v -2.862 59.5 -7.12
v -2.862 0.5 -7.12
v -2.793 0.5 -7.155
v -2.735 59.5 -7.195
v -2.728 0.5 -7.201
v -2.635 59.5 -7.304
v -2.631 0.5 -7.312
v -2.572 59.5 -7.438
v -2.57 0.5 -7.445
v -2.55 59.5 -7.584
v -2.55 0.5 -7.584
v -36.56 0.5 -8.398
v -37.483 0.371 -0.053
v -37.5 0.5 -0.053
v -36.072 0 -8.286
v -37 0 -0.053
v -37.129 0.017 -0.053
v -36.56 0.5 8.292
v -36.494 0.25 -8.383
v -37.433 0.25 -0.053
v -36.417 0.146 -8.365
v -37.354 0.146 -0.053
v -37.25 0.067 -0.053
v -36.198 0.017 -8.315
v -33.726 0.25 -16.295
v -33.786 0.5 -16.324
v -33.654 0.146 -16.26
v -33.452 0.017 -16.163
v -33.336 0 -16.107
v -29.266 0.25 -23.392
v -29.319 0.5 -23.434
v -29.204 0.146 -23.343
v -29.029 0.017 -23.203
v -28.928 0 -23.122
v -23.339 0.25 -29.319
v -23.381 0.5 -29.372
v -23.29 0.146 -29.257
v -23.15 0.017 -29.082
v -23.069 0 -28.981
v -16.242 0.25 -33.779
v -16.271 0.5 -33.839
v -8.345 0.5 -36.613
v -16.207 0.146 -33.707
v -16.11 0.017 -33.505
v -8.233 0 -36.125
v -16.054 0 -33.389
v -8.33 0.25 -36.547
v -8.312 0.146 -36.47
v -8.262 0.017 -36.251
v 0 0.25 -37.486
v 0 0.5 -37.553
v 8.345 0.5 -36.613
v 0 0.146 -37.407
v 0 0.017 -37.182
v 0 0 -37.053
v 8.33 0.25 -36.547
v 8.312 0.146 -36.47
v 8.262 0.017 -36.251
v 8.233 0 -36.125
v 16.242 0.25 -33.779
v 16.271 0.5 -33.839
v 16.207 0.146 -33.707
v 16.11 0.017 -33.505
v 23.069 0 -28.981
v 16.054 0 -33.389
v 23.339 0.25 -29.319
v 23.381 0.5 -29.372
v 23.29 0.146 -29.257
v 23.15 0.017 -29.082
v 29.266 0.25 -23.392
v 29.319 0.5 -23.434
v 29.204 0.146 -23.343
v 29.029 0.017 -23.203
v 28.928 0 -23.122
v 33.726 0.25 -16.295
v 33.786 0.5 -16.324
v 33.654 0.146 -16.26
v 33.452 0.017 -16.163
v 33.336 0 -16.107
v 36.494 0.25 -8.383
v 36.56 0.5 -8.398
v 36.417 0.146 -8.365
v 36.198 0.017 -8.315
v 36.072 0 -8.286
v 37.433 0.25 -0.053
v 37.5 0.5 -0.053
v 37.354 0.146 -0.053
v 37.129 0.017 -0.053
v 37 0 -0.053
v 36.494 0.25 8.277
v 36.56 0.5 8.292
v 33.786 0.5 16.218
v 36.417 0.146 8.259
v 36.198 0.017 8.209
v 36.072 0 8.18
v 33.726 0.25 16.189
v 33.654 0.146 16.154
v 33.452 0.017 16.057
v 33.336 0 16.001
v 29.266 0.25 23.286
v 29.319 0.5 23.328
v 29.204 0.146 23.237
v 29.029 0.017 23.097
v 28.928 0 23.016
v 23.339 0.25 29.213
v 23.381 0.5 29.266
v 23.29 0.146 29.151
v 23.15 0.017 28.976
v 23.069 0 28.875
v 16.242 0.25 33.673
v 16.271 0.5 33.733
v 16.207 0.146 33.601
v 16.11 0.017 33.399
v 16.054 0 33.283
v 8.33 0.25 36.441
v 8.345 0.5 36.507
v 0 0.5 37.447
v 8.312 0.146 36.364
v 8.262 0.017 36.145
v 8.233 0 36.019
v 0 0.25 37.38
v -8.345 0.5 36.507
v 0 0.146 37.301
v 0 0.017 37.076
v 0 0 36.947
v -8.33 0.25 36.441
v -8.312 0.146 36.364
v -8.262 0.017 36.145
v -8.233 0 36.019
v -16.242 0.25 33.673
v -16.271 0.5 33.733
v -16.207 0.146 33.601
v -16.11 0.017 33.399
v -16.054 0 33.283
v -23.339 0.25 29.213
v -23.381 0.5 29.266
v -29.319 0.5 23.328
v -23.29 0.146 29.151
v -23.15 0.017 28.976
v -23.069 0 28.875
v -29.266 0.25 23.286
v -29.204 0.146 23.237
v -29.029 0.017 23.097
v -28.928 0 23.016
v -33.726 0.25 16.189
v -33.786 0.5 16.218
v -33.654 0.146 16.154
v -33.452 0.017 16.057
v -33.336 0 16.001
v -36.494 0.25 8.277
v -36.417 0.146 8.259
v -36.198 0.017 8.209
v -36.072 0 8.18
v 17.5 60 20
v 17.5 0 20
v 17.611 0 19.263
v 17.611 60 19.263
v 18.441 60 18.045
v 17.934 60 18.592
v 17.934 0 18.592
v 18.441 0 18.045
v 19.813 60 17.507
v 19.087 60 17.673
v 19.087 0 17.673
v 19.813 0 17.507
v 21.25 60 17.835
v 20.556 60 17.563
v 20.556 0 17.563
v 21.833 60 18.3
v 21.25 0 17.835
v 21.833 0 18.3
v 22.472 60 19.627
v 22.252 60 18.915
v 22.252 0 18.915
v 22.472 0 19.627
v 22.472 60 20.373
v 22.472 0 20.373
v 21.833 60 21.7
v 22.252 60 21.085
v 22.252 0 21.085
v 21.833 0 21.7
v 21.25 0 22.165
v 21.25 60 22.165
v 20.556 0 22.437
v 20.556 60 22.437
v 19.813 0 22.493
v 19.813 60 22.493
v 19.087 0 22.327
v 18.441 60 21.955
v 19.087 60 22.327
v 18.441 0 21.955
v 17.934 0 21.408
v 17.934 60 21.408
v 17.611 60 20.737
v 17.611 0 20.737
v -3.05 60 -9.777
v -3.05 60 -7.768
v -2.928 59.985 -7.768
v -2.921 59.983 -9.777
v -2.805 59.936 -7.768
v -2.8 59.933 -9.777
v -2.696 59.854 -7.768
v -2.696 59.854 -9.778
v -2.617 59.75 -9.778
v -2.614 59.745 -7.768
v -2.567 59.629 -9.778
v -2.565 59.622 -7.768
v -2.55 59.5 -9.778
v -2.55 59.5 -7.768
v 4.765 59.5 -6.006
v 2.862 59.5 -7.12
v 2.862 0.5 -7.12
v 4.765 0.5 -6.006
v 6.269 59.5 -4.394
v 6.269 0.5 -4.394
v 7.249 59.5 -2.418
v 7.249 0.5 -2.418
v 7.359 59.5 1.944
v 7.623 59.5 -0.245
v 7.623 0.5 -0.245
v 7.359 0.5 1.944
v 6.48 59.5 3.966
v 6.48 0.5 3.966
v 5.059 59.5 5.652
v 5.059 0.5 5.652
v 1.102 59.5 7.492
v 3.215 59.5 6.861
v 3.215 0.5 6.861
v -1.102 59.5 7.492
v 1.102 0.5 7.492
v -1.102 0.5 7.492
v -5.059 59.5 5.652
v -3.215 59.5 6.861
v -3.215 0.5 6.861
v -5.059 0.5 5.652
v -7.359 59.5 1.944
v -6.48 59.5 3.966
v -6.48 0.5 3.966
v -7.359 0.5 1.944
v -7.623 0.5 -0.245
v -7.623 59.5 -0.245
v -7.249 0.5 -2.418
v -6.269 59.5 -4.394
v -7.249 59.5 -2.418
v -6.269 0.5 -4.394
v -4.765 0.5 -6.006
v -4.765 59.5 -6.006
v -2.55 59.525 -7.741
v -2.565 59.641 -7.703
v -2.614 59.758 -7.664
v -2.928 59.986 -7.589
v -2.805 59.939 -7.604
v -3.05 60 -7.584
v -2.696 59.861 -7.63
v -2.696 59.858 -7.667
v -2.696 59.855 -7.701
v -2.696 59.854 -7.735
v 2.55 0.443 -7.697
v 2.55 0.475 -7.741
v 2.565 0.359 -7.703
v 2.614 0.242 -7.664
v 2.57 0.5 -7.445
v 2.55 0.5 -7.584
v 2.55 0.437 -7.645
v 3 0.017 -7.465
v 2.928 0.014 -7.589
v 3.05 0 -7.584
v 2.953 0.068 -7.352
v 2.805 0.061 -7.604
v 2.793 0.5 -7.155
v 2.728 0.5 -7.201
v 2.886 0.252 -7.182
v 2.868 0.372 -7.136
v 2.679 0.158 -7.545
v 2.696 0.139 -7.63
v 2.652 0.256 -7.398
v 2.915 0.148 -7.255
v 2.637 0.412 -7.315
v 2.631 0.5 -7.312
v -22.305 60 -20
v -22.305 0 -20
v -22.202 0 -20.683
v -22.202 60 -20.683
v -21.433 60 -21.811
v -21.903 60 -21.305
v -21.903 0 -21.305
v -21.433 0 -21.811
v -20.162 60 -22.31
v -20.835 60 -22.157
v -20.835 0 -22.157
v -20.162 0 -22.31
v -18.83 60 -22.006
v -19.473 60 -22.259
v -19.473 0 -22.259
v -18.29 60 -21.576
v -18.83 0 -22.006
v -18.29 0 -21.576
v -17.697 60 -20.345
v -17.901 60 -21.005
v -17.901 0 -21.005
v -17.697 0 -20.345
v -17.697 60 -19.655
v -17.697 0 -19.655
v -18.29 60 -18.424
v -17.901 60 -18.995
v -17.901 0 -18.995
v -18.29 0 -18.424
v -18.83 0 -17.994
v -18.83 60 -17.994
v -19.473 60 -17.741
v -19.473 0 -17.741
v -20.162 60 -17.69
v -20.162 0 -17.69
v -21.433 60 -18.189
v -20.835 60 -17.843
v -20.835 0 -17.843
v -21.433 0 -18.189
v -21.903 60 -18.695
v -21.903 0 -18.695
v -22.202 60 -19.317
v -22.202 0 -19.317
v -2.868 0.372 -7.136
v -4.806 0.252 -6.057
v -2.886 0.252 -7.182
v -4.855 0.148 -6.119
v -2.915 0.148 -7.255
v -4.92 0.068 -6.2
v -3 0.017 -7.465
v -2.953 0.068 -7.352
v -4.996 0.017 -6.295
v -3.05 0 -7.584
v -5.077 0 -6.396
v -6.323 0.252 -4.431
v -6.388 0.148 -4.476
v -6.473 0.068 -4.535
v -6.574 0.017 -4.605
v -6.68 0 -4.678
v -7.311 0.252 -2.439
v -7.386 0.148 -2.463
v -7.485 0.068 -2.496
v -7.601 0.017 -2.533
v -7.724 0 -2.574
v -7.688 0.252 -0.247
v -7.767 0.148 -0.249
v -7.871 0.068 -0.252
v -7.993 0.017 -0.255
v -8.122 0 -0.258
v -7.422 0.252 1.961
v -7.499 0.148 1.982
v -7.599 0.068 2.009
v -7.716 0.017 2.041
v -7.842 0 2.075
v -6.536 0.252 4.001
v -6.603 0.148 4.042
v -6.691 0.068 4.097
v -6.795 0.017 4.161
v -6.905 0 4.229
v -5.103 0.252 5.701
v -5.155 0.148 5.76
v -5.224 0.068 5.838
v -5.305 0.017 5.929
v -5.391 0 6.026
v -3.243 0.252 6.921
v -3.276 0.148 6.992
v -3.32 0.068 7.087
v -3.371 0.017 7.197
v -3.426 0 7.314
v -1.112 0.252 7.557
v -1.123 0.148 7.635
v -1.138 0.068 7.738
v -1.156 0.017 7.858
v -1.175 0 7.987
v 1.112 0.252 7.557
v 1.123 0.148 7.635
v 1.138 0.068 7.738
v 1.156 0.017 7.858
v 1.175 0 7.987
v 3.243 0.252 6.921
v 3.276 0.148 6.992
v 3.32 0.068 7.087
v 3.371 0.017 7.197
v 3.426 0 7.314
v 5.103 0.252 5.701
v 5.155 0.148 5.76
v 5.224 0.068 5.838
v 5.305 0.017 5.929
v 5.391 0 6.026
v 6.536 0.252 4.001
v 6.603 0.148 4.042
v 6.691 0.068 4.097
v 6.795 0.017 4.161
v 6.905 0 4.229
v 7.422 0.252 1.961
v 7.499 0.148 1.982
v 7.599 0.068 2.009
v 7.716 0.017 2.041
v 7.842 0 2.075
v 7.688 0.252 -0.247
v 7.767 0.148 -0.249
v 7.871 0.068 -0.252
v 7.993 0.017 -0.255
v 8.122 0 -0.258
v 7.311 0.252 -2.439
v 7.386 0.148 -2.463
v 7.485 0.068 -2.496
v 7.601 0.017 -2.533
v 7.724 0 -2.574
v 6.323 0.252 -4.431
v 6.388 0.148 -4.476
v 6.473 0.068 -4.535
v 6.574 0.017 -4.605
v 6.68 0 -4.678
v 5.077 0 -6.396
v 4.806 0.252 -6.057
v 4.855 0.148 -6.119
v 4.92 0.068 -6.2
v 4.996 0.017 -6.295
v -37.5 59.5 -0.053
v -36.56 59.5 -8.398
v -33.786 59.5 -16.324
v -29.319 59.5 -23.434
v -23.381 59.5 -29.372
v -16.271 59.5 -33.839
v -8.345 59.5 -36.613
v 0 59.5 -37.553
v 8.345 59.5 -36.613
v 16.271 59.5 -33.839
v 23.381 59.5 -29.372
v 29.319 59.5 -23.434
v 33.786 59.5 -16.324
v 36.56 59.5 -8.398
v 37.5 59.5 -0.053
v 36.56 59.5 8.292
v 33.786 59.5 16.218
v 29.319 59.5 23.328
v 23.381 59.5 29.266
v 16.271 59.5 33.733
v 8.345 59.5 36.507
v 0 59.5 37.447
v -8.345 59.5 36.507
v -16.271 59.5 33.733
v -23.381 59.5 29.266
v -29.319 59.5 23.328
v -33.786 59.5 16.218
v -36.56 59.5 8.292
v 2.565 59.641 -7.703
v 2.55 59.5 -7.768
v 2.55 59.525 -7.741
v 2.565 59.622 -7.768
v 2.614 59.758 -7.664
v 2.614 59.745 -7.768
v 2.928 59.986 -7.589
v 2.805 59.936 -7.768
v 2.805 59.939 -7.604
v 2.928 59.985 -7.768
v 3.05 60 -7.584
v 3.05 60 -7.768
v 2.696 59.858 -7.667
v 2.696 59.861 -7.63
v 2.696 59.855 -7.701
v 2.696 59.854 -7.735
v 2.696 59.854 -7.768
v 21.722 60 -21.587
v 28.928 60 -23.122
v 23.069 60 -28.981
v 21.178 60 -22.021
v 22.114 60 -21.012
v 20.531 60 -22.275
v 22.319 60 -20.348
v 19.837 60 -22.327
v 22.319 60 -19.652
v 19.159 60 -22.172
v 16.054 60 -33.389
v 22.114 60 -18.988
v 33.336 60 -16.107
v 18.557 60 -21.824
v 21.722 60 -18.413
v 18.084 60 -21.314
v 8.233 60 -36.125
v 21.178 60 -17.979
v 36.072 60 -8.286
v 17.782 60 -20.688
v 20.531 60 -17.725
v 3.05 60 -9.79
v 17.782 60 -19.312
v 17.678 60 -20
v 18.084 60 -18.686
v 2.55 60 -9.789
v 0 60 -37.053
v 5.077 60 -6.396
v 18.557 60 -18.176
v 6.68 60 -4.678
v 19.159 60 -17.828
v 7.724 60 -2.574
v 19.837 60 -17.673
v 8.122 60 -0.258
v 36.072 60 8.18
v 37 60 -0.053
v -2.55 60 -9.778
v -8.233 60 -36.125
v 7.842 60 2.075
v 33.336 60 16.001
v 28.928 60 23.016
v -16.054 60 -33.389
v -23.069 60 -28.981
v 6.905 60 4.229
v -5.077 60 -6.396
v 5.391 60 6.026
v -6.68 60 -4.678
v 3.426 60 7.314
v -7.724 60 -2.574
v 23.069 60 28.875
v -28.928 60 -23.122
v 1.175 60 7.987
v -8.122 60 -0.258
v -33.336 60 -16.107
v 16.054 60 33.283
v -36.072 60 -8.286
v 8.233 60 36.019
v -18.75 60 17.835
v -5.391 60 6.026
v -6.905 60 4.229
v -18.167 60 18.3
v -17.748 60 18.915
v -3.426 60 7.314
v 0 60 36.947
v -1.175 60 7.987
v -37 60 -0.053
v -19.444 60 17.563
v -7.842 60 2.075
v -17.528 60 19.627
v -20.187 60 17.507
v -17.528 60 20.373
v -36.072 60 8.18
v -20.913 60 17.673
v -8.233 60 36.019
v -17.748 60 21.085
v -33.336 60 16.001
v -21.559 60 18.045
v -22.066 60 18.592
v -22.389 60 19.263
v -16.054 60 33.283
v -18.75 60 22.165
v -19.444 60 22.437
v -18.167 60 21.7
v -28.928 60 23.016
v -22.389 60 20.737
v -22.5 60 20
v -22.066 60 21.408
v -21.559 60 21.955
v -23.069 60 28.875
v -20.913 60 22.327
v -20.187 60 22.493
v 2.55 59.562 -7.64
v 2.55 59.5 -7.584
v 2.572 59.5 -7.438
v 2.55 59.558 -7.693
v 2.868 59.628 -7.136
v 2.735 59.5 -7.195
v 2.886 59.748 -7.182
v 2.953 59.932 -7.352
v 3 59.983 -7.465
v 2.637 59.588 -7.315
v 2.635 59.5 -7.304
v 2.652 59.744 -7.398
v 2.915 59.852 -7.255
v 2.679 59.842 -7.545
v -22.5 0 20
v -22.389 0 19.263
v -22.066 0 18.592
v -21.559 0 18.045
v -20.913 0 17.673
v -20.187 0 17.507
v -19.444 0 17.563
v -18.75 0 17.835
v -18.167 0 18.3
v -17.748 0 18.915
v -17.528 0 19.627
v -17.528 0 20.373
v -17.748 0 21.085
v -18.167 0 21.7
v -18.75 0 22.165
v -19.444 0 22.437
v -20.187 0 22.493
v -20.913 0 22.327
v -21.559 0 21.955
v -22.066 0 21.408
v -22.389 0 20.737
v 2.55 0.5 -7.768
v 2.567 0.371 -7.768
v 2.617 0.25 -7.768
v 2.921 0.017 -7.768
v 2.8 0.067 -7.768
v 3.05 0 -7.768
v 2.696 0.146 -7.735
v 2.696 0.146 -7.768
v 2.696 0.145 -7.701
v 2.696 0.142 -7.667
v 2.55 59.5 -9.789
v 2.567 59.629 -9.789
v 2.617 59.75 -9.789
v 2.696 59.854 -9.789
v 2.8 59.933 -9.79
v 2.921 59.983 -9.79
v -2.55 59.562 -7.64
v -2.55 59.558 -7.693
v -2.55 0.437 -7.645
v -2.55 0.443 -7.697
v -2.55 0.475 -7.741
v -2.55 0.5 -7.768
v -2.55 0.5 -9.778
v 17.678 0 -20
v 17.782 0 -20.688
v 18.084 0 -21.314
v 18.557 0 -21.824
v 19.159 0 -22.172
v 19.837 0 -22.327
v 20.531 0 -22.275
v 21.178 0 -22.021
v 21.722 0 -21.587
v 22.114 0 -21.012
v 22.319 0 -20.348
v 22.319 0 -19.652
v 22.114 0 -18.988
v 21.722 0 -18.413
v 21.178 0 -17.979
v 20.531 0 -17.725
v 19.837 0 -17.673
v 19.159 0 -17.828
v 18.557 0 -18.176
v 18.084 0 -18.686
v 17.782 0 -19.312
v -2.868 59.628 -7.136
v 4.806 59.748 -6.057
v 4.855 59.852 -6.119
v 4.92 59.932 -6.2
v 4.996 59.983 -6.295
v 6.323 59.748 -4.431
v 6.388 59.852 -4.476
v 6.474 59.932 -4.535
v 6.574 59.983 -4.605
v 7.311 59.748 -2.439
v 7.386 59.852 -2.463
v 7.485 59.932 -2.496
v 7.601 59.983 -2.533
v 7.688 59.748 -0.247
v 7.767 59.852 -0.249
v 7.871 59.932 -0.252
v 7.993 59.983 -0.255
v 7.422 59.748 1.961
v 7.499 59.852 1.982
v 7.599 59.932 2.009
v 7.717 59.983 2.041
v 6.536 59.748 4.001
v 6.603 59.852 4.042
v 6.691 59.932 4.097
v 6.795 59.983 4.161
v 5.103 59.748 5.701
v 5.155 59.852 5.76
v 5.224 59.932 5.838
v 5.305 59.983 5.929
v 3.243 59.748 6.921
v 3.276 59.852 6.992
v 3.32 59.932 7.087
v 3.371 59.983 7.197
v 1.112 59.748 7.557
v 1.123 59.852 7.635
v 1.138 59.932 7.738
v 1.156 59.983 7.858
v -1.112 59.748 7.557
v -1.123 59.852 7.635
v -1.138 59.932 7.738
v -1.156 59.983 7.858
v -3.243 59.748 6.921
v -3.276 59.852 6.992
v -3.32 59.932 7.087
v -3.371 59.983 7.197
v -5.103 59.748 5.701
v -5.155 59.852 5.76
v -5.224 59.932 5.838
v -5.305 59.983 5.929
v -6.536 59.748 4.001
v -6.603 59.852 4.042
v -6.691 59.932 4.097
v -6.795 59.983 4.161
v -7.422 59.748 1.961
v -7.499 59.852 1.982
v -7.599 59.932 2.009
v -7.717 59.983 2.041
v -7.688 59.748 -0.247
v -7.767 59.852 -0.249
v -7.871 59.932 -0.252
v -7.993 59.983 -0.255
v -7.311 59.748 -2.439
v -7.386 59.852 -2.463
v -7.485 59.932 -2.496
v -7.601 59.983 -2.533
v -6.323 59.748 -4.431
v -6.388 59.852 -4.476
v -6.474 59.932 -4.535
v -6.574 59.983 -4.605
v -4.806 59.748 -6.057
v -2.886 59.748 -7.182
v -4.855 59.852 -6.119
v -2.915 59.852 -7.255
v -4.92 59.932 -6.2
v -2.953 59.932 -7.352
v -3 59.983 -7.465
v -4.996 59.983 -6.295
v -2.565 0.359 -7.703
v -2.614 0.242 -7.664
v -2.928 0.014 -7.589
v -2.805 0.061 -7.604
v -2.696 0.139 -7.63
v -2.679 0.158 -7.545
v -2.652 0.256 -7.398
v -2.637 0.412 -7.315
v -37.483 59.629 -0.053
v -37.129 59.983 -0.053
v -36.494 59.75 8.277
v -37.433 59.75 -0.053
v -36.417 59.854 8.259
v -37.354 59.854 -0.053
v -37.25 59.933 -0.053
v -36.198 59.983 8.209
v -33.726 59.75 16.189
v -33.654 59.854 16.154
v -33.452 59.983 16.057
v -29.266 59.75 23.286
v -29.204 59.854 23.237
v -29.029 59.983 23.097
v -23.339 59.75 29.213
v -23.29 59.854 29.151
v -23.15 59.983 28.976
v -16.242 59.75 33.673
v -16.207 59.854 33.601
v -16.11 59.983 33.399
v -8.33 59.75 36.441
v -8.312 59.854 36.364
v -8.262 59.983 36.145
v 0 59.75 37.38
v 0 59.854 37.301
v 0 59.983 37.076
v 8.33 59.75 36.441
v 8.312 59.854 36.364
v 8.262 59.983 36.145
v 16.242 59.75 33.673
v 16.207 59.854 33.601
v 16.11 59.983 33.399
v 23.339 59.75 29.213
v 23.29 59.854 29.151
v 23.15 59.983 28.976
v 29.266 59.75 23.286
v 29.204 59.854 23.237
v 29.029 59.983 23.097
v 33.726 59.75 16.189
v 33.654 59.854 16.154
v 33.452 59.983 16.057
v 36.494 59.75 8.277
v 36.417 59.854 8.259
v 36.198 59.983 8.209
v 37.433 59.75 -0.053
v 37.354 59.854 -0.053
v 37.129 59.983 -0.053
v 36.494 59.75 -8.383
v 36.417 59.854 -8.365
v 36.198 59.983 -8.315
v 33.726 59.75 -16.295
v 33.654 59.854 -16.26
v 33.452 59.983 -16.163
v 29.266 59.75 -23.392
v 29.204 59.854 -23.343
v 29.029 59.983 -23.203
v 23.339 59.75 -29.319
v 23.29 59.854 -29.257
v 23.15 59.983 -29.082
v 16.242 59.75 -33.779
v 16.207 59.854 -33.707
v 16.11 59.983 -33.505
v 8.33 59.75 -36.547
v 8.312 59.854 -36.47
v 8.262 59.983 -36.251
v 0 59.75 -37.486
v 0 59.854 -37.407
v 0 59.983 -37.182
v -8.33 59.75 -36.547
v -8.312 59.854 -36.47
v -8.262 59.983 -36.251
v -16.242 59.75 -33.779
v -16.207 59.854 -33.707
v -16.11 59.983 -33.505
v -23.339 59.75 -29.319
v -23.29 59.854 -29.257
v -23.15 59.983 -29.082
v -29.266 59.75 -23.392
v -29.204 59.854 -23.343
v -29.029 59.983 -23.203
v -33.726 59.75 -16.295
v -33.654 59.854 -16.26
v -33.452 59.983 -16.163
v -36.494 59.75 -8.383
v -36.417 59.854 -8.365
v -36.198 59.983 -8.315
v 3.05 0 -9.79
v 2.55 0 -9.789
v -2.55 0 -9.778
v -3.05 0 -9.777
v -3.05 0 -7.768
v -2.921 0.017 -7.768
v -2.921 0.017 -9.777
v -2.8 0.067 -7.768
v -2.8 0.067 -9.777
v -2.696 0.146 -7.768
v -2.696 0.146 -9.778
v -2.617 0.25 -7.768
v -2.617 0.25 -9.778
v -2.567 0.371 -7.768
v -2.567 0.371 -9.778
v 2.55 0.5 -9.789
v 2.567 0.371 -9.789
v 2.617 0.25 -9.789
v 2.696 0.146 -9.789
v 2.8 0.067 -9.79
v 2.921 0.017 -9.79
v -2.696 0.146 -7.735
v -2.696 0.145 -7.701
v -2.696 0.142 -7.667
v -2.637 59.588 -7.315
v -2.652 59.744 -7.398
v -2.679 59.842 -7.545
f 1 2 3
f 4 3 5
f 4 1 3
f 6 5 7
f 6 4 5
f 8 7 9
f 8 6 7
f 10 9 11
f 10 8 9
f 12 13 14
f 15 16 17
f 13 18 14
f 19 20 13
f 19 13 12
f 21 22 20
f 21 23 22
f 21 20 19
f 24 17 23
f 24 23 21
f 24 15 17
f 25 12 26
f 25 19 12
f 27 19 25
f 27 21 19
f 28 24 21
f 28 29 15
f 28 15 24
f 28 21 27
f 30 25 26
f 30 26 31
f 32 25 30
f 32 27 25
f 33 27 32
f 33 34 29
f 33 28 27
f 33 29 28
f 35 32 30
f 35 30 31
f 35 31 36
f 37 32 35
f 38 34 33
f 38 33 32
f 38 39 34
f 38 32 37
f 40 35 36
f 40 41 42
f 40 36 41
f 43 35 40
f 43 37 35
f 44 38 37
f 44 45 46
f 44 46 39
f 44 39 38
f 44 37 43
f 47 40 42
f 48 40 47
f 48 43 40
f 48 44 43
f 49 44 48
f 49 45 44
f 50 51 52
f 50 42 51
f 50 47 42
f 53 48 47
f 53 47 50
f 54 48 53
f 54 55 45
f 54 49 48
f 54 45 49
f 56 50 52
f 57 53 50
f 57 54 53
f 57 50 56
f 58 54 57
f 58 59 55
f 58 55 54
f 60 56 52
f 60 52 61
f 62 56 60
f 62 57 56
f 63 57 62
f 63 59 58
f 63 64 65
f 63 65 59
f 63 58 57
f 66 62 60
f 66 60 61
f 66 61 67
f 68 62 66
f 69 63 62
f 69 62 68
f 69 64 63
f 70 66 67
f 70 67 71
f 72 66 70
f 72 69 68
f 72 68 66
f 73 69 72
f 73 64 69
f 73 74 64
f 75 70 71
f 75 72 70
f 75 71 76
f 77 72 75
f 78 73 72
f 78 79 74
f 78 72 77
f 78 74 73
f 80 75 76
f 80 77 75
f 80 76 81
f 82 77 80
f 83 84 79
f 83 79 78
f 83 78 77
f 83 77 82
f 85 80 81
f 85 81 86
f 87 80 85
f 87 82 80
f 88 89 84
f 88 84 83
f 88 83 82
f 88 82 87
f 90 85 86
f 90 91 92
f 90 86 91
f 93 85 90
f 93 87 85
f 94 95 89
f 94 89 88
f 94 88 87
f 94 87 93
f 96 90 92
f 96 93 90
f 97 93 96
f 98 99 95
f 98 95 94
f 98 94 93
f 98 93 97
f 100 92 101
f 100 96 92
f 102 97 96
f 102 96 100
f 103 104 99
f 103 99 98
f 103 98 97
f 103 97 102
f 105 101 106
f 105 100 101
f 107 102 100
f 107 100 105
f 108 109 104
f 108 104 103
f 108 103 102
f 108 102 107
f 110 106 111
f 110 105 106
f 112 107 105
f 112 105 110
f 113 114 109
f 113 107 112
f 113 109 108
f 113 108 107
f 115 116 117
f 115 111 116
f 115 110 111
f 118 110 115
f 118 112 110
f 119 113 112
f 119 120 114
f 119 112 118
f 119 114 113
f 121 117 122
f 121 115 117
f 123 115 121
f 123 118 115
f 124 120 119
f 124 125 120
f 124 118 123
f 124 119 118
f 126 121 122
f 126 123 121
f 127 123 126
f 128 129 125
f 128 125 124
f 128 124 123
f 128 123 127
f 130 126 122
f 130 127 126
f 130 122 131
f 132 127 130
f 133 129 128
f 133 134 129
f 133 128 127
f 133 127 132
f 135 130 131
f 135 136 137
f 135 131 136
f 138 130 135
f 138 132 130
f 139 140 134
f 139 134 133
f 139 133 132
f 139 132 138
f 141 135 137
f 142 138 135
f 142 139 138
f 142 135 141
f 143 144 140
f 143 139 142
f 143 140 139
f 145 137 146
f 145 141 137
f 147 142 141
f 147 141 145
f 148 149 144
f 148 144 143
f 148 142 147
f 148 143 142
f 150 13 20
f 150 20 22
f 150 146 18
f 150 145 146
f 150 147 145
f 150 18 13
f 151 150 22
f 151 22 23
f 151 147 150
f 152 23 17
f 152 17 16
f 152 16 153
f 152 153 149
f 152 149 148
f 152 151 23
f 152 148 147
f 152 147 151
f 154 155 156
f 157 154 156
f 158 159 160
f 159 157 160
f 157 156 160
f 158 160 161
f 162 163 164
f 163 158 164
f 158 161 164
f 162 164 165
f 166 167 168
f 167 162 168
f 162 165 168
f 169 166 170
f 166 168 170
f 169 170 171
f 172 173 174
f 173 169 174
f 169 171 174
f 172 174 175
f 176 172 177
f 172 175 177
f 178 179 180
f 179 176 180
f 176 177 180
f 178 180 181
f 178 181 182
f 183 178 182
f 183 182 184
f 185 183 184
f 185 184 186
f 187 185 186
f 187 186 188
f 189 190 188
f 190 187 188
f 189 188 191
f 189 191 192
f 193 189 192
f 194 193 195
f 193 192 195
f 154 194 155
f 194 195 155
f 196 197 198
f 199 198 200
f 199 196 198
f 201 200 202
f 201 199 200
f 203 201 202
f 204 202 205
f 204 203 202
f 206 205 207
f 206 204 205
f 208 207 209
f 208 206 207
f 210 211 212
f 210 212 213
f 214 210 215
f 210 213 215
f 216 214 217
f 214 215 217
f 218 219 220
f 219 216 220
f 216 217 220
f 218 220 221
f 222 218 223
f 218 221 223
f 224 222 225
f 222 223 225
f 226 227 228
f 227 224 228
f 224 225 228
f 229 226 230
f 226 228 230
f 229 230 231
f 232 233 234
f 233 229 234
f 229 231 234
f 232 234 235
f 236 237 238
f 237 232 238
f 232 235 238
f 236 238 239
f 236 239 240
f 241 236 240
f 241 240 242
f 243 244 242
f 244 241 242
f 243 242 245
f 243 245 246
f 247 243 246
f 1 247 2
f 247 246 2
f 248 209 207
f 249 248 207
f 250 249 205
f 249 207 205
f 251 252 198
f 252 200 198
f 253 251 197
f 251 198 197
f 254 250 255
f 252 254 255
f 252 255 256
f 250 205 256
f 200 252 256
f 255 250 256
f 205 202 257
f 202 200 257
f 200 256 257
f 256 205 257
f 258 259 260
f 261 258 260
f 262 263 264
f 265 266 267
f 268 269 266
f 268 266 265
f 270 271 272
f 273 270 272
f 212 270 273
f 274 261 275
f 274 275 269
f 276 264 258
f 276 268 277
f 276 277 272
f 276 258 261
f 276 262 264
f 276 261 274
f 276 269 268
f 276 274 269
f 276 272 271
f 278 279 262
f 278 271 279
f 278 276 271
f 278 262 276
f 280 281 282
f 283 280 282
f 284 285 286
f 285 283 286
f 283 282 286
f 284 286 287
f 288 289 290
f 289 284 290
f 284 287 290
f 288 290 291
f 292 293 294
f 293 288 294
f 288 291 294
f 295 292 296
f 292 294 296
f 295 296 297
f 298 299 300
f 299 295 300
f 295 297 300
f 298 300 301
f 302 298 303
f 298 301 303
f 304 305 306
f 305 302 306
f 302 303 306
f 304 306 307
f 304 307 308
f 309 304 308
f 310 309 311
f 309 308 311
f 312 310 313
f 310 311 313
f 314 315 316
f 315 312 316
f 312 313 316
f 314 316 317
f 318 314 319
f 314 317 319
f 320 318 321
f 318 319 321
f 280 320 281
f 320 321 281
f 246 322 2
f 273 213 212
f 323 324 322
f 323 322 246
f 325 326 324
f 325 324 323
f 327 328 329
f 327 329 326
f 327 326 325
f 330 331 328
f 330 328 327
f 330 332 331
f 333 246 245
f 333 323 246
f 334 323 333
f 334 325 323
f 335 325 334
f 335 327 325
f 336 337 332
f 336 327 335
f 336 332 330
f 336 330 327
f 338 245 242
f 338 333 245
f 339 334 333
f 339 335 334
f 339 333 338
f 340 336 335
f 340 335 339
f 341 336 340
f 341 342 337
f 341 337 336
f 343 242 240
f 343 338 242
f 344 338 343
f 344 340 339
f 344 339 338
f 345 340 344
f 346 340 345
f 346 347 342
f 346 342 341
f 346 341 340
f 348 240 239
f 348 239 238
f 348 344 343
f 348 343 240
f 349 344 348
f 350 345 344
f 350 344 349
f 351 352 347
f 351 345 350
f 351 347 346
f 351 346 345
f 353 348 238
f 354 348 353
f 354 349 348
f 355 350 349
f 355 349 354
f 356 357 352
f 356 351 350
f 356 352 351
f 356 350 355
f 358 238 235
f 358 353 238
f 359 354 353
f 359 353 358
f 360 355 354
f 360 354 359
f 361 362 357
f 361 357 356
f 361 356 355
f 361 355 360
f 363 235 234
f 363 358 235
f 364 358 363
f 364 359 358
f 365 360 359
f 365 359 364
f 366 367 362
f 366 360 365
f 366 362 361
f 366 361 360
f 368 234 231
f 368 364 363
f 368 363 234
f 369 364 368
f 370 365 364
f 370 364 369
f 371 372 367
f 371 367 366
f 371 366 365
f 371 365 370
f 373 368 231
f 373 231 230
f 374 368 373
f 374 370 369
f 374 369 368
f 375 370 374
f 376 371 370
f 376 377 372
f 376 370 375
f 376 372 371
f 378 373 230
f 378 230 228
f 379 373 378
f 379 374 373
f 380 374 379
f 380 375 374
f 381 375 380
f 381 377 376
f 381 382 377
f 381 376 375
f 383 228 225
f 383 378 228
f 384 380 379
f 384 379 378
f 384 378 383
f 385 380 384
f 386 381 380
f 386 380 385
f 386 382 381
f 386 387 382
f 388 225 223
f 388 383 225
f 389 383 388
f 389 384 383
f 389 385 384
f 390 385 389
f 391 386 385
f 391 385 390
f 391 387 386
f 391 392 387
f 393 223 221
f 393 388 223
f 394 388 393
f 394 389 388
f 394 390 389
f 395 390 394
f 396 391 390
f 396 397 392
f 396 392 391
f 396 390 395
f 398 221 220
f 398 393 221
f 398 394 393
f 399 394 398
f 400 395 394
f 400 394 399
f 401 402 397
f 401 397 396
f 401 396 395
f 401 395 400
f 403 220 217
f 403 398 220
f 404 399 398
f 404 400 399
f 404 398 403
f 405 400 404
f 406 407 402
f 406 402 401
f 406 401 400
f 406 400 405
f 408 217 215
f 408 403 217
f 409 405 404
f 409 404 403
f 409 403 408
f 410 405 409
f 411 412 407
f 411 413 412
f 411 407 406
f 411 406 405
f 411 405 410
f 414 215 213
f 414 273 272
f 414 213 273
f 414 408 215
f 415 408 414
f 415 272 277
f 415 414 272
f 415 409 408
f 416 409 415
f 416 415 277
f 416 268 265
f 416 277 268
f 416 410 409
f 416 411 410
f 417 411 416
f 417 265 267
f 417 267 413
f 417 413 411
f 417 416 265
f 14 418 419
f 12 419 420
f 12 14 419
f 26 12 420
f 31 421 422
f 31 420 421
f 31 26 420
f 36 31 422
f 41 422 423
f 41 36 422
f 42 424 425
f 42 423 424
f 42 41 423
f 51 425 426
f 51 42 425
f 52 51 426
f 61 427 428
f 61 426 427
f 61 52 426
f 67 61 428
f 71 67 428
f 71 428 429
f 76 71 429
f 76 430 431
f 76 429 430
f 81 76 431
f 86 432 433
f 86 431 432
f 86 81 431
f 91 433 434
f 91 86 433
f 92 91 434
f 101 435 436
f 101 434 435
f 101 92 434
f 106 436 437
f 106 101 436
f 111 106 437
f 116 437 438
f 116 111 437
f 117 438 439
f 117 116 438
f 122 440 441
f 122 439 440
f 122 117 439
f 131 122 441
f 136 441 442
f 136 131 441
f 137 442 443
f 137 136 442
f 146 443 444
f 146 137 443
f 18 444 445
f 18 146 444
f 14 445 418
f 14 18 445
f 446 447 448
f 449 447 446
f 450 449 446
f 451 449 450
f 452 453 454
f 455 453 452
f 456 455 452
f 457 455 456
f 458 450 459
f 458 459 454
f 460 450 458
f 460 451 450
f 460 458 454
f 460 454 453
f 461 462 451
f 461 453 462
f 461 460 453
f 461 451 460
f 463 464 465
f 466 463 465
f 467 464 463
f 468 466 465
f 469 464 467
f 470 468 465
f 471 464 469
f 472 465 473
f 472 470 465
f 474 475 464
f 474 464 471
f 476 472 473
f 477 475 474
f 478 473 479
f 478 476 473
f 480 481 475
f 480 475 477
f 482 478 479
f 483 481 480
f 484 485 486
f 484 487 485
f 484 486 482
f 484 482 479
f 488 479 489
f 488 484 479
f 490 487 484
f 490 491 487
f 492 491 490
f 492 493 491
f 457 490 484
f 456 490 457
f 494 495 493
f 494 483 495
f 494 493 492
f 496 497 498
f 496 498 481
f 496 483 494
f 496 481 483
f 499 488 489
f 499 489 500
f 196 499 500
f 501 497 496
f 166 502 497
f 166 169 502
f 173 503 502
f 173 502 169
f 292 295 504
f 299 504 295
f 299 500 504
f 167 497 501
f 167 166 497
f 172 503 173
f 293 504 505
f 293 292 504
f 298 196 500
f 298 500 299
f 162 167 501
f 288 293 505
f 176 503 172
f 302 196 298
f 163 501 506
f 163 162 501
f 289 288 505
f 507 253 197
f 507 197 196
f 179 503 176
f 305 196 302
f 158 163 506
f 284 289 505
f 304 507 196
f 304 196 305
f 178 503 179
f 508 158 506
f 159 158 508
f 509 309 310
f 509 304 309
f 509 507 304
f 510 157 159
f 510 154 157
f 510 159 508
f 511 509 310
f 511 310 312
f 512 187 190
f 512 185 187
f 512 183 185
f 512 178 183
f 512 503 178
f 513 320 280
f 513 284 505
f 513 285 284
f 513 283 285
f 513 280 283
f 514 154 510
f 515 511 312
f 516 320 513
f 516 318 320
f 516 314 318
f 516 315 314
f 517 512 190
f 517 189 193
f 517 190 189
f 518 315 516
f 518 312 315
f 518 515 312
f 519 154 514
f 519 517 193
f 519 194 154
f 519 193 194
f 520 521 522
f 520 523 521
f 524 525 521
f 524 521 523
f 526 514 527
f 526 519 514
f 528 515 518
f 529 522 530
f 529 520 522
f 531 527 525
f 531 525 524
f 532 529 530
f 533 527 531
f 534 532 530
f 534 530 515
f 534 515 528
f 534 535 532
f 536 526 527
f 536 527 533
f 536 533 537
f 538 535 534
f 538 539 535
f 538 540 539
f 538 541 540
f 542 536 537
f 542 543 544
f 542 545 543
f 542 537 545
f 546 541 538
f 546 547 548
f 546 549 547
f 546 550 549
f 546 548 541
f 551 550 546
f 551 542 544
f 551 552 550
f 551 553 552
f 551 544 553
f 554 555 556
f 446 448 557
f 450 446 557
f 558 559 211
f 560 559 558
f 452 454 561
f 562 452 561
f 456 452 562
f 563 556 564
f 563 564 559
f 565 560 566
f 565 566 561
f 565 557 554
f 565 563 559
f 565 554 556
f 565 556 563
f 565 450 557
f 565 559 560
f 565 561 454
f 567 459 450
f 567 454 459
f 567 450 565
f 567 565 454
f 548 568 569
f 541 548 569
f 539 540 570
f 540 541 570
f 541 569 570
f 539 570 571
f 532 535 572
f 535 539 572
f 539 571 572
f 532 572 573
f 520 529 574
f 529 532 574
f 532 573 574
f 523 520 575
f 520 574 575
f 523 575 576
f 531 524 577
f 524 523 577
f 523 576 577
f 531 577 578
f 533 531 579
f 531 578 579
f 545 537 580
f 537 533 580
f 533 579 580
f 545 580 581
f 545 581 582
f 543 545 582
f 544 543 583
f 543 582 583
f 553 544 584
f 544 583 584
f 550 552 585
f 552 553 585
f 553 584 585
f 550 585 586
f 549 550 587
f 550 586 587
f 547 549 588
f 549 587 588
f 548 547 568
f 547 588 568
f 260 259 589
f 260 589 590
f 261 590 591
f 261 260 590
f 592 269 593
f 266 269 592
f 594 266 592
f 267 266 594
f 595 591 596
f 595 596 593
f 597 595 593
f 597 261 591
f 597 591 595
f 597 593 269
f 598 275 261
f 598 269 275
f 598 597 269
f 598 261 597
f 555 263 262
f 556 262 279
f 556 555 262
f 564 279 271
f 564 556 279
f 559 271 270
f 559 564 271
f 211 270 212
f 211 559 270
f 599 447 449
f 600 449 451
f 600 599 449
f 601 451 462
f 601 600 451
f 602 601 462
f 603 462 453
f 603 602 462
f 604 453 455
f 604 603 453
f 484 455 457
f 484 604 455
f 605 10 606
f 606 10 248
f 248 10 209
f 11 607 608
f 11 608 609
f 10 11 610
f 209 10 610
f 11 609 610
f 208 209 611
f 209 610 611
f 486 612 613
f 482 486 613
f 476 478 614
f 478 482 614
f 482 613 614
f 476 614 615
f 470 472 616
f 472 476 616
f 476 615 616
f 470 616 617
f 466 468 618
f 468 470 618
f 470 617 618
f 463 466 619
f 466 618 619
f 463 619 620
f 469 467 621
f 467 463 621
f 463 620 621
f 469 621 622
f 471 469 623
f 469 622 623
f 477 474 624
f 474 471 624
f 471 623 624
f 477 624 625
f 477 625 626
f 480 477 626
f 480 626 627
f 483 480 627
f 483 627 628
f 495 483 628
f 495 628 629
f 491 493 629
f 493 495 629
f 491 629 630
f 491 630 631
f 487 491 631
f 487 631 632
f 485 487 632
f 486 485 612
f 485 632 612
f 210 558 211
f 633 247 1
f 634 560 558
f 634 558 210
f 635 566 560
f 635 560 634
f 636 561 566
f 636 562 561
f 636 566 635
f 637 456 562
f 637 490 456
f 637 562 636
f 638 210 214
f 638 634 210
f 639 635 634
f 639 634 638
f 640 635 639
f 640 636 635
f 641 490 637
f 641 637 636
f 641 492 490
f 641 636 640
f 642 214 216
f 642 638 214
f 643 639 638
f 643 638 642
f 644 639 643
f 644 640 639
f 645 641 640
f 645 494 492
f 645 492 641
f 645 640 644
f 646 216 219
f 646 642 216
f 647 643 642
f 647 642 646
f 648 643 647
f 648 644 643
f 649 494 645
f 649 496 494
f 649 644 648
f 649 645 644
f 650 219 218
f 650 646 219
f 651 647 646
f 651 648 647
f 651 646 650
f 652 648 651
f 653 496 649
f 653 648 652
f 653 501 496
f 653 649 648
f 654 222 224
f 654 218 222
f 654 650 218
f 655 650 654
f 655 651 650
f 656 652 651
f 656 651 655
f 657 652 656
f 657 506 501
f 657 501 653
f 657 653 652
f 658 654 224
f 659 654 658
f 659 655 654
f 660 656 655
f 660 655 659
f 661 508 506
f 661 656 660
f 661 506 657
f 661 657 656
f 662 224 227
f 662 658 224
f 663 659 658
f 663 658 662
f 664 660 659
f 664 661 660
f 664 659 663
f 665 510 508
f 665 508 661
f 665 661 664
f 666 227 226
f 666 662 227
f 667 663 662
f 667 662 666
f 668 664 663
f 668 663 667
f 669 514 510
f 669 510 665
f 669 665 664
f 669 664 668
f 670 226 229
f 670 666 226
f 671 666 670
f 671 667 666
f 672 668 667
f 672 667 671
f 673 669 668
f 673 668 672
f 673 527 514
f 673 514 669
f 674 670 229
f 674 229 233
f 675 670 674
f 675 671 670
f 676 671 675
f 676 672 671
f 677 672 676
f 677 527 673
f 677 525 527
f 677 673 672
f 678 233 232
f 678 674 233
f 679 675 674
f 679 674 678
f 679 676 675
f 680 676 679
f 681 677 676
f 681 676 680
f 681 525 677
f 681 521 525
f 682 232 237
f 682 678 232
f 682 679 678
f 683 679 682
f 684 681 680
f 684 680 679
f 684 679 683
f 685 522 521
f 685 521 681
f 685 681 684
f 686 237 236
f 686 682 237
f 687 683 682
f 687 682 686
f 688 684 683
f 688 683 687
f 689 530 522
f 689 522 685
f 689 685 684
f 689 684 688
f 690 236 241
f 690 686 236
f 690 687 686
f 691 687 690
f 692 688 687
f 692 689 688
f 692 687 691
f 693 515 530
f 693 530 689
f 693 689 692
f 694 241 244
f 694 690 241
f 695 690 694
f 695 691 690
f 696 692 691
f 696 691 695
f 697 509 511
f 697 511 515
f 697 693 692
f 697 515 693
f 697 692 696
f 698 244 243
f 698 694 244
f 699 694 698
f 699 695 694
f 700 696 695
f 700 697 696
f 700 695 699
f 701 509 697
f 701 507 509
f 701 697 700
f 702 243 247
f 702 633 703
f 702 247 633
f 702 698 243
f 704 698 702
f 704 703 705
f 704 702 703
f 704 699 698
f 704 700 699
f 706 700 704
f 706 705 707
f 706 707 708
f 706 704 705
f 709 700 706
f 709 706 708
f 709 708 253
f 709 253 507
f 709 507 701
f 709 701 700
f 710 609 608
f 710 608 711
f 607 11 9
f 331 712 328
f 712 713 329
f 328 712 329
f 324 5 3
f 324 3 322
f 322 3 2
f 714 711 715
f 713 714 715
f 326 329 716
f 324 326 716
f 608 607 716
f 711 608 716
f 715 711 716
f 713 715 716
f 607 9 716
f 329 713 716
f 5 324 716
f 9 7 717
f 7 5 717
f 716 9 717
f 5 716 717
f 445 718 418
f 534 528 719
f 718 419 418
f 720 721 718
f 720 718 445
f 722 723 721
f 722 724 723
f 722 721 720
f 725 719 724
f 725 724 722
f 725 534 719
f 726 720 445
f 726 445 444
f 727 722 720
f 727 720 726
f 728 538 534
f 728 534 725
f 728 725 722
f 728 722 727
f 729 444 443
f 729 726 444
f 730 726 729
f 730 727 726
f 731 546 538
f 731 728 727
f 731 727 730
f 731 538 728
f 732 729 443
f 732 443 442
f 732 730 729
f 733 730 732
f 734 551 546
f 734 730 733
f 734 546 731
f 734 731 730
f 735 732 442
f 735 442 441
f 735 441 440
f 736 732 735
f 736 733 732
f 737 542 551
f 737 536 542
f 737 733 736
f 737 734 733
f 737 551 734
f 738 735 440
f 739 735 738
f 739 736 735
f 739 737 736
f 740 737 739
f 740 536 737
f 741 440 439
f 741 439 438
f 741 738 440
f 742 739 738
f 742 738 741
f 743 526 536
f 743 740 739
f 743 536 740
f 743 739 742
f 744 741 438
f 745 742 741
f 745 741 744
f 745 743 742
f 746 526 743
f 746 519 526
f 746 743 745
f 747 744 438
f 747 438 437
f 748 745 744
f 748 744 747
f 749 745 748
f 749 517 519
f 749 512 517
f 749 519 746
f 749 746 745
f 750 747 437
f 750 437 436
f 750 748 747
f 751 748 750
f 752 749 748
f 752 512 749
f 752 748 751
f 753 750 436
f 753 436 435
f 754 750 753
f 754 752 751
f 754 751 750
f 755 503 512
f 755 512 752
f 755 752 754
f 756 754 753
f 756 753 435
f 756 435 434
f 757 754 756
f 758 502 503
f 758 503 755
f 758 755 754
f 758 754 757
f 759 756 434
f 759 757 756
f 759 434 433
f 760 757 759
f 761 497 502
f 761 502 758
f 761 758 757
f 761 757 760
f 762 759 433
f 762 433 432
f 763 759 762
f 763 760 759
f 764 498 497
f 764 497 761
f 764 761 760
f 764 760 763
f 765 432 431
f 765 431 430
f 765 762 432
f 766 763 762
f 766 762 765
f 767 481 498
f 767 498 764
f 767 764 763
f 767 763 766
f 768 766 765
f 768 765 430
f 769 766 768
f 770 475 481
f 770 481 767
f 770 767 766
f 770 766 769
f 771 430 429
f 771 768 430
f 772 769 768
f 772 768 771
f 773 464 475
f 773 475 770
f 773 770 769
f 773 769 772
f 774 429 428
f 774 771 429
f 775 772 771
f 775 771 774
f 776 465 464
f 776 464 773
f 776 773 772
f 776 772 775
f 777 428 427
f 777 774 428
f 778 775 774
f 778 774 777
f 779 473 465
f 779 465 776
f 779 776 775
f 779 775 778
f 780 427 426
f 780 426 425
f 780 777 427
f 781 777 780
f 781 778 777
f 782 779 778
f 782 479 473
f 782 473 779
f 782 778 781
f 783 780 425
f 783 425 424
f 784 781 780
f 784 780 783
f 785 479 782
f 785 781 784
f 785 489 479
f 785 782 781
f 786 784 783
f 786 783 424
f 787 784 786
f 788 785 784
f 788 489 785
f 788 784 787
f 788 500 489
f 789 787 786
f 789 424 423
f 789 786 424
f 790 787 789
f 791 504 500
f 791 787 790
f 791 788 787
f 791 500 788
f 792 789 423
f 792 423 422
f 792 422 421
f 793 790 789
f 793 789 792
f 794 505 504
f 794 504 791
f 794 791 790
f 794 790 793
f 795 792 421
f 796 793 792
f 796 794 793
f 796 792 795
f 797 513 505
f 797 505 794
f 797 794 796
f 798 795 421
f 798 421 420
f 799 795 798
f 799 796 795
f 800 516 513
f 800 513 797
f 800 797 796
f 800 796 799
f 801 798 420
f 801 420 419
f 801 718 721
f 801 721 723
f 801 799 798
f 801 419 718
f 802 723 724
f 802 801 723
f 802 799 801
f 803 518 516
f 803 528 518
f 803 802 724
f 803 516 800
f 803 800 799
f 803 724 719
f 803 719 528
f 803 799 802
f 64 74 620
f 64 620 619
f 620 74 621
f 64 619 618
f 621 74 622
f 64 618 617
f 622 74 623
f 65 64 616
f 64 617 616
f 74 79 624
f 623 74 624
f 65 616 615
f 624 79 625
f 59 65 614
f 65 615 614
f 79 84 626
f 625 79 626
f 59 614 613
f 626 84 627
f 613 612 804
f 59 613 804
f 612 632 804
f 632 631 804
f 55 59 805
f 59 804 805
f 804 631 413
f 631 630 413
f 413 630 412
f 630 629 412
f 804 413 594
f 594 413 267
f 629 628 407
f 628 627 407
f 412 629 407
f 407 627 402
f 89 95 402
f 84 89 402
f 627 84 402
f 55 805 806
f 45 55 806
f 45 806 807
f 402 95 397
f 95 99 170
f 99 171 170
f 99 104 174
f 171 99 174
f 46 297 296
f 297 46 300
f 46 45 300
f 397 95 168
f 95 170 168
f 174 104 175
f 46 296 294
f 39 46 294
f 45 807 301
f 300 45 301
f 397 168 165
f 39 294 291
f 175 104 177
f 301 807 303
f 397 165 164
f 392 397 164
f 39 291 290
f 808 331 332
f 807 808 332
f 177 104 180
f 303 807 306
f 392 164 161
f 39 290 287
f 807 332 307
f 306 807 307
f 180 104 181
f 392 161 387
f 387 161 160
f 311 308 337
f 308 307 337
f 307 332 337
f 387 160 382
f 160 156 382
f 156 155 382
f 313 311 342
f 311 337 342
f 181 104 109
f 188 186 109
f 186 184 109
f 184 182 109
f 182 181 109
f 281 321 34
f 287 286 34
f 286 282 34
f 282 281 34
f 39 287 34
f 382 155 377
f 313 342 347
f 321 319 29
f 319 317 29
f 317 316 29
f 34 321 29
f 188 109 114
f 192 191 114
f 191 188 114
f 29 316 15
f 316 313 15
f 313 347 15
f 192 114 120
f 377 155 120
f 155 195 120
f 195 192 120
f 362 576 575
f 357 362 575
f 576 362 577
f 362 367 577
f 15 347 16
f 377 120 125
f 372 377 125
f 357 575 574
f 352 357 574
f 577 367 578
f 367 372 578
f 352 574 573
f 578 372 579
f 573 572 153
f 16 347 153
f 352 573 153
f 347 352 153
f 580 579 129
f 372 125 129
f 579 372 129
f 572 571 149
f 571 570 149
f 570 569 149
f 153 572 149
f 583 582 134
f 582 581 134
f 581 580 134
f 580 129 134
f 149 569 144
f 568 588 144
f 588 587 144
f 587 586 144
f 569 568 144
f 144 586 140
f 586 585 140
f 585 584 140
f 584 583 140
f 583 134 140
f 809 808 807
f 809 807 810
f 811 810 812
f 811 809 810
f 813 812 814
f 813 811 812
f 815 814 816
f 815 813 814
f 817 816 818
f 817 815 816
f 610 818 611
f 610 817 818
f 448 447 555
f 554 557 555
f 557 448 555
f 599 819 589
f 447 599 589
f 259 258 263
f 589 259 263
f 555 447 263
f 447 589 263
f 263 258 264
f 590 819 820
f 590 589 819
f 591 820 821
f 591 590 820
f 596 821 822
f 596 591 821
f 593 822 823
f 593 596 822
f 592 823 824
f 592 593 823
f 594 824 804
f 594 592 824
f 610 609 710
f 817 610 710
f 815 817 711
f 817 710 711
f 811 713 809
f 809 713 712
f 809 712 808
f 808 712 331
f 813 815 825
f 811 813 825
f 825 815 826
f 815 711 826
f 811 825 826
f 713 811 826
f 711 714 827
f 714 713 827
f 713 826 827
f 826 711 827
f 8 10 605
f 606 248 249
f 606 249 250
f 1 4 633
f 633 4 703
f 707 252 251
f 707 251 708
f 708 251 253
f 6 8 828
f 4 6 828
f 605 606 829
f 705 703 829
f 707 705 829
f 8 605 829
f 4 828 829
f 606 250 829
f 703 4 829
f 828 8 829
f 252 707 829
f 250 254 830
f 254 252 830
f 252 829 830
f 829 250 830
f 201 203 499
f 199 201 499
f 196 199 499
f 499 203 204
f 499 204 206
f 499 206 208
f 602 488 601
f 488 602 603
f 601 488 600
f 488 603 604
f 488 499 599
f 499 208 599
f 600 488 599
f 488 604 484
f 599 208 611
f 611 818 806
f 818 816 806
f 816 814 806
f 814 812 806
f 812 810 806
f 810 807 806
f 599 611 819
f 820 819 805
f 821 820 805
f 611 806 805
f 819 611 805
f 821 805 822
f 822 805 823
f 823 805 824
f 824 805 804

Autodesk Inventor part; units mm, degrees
ref_plane "YZ Plane" through (0, 0, 0) normal (1, 0, 0) x (0, 1, 0)
ref_plane "XZ Plane" through (0, 0, 0) normal (0, 1, 0) x (-1, 0, 0)
ref_plane "XY Plane" through (0, 0, 0) normal (0, 0, 1) x (1, 0, 0)
sketch "Sketch1" plane through (0, 0, 0) normal (0, 1, 0) x (-1, 0, 0)
  circle A0 centre (-20, 20) radius 2.5
  circle A1 centre (-20.0115, -20) radius 2.3331
  circle A2 centre (20, 20) radius 2.5
  circle A3 centre (19.9885, -20) radius 2.3169
  circle A4 centre (0, -0.053) radius 37.5
  line L0 (2.55, -7.239) -> (2.55, -9.7779)
  line L1 (2.55, -9.7779) -> (-2.55, -9.789)
  line L2 (-2.55, -9.789) -> (-2.55, -7.239)
  line L3 (-2.55, -5.5721) -> (2.55, -9.7779) construction
  line L4 (2.55, -5.561) -> (-2.55, -9.789) construction
  line L5 (0, -0.053) -> (0, -12.2317) construction
  arc A5 (2.55, -7.239) -> (-2.55, -7.239) centre (0, -0.053) ccw
  point P0 (0, 0)
  point P1 (0, -7.675)
  point P2 (2.55, -8.5084)
  point P3 (-2.55, -8.514)
  dimension "d1" = 40
  dimension "d2" = 40
  dimension "d3" = 40
  dimension "d4" = 40
  dimension "d10" = 75
  dimension "d16" = 0
  dimension "d17" = 2.55
  dimension "d19" = 5.1
  dimension "d20" = 0
  dimension "d21" = 0
  dimension "d22" = 2.1084
  dimension "d24" = 7.625
extrude "Extrusion1" add sketch "Sketch1" along normal blind 60
fillet "Fillet1" radius 0.5 4 edges at (37.5, 60, -0.053) (37.5, 0, -0.053) (0, 60, 7.572) (0, 0, 7.572)
fillet "Fillet2" radius 0.5 10 edges at (-2.55, 59.8545, -7.3953) (-2.55, 60, -8.7727) (-2.55, 0.1455, -7.3953) (-2.55, 0, -8.7727) (-2.55, 30, -7.239) (2.55, 59.8545, -7.3953) (2.55, 60, -8.7783) (2.55, 0.1455, -7.3953) (2.55, 0, -8.7783) (2.55, 30, -7.239)
properties part number "Flansch 3Ddruck"
